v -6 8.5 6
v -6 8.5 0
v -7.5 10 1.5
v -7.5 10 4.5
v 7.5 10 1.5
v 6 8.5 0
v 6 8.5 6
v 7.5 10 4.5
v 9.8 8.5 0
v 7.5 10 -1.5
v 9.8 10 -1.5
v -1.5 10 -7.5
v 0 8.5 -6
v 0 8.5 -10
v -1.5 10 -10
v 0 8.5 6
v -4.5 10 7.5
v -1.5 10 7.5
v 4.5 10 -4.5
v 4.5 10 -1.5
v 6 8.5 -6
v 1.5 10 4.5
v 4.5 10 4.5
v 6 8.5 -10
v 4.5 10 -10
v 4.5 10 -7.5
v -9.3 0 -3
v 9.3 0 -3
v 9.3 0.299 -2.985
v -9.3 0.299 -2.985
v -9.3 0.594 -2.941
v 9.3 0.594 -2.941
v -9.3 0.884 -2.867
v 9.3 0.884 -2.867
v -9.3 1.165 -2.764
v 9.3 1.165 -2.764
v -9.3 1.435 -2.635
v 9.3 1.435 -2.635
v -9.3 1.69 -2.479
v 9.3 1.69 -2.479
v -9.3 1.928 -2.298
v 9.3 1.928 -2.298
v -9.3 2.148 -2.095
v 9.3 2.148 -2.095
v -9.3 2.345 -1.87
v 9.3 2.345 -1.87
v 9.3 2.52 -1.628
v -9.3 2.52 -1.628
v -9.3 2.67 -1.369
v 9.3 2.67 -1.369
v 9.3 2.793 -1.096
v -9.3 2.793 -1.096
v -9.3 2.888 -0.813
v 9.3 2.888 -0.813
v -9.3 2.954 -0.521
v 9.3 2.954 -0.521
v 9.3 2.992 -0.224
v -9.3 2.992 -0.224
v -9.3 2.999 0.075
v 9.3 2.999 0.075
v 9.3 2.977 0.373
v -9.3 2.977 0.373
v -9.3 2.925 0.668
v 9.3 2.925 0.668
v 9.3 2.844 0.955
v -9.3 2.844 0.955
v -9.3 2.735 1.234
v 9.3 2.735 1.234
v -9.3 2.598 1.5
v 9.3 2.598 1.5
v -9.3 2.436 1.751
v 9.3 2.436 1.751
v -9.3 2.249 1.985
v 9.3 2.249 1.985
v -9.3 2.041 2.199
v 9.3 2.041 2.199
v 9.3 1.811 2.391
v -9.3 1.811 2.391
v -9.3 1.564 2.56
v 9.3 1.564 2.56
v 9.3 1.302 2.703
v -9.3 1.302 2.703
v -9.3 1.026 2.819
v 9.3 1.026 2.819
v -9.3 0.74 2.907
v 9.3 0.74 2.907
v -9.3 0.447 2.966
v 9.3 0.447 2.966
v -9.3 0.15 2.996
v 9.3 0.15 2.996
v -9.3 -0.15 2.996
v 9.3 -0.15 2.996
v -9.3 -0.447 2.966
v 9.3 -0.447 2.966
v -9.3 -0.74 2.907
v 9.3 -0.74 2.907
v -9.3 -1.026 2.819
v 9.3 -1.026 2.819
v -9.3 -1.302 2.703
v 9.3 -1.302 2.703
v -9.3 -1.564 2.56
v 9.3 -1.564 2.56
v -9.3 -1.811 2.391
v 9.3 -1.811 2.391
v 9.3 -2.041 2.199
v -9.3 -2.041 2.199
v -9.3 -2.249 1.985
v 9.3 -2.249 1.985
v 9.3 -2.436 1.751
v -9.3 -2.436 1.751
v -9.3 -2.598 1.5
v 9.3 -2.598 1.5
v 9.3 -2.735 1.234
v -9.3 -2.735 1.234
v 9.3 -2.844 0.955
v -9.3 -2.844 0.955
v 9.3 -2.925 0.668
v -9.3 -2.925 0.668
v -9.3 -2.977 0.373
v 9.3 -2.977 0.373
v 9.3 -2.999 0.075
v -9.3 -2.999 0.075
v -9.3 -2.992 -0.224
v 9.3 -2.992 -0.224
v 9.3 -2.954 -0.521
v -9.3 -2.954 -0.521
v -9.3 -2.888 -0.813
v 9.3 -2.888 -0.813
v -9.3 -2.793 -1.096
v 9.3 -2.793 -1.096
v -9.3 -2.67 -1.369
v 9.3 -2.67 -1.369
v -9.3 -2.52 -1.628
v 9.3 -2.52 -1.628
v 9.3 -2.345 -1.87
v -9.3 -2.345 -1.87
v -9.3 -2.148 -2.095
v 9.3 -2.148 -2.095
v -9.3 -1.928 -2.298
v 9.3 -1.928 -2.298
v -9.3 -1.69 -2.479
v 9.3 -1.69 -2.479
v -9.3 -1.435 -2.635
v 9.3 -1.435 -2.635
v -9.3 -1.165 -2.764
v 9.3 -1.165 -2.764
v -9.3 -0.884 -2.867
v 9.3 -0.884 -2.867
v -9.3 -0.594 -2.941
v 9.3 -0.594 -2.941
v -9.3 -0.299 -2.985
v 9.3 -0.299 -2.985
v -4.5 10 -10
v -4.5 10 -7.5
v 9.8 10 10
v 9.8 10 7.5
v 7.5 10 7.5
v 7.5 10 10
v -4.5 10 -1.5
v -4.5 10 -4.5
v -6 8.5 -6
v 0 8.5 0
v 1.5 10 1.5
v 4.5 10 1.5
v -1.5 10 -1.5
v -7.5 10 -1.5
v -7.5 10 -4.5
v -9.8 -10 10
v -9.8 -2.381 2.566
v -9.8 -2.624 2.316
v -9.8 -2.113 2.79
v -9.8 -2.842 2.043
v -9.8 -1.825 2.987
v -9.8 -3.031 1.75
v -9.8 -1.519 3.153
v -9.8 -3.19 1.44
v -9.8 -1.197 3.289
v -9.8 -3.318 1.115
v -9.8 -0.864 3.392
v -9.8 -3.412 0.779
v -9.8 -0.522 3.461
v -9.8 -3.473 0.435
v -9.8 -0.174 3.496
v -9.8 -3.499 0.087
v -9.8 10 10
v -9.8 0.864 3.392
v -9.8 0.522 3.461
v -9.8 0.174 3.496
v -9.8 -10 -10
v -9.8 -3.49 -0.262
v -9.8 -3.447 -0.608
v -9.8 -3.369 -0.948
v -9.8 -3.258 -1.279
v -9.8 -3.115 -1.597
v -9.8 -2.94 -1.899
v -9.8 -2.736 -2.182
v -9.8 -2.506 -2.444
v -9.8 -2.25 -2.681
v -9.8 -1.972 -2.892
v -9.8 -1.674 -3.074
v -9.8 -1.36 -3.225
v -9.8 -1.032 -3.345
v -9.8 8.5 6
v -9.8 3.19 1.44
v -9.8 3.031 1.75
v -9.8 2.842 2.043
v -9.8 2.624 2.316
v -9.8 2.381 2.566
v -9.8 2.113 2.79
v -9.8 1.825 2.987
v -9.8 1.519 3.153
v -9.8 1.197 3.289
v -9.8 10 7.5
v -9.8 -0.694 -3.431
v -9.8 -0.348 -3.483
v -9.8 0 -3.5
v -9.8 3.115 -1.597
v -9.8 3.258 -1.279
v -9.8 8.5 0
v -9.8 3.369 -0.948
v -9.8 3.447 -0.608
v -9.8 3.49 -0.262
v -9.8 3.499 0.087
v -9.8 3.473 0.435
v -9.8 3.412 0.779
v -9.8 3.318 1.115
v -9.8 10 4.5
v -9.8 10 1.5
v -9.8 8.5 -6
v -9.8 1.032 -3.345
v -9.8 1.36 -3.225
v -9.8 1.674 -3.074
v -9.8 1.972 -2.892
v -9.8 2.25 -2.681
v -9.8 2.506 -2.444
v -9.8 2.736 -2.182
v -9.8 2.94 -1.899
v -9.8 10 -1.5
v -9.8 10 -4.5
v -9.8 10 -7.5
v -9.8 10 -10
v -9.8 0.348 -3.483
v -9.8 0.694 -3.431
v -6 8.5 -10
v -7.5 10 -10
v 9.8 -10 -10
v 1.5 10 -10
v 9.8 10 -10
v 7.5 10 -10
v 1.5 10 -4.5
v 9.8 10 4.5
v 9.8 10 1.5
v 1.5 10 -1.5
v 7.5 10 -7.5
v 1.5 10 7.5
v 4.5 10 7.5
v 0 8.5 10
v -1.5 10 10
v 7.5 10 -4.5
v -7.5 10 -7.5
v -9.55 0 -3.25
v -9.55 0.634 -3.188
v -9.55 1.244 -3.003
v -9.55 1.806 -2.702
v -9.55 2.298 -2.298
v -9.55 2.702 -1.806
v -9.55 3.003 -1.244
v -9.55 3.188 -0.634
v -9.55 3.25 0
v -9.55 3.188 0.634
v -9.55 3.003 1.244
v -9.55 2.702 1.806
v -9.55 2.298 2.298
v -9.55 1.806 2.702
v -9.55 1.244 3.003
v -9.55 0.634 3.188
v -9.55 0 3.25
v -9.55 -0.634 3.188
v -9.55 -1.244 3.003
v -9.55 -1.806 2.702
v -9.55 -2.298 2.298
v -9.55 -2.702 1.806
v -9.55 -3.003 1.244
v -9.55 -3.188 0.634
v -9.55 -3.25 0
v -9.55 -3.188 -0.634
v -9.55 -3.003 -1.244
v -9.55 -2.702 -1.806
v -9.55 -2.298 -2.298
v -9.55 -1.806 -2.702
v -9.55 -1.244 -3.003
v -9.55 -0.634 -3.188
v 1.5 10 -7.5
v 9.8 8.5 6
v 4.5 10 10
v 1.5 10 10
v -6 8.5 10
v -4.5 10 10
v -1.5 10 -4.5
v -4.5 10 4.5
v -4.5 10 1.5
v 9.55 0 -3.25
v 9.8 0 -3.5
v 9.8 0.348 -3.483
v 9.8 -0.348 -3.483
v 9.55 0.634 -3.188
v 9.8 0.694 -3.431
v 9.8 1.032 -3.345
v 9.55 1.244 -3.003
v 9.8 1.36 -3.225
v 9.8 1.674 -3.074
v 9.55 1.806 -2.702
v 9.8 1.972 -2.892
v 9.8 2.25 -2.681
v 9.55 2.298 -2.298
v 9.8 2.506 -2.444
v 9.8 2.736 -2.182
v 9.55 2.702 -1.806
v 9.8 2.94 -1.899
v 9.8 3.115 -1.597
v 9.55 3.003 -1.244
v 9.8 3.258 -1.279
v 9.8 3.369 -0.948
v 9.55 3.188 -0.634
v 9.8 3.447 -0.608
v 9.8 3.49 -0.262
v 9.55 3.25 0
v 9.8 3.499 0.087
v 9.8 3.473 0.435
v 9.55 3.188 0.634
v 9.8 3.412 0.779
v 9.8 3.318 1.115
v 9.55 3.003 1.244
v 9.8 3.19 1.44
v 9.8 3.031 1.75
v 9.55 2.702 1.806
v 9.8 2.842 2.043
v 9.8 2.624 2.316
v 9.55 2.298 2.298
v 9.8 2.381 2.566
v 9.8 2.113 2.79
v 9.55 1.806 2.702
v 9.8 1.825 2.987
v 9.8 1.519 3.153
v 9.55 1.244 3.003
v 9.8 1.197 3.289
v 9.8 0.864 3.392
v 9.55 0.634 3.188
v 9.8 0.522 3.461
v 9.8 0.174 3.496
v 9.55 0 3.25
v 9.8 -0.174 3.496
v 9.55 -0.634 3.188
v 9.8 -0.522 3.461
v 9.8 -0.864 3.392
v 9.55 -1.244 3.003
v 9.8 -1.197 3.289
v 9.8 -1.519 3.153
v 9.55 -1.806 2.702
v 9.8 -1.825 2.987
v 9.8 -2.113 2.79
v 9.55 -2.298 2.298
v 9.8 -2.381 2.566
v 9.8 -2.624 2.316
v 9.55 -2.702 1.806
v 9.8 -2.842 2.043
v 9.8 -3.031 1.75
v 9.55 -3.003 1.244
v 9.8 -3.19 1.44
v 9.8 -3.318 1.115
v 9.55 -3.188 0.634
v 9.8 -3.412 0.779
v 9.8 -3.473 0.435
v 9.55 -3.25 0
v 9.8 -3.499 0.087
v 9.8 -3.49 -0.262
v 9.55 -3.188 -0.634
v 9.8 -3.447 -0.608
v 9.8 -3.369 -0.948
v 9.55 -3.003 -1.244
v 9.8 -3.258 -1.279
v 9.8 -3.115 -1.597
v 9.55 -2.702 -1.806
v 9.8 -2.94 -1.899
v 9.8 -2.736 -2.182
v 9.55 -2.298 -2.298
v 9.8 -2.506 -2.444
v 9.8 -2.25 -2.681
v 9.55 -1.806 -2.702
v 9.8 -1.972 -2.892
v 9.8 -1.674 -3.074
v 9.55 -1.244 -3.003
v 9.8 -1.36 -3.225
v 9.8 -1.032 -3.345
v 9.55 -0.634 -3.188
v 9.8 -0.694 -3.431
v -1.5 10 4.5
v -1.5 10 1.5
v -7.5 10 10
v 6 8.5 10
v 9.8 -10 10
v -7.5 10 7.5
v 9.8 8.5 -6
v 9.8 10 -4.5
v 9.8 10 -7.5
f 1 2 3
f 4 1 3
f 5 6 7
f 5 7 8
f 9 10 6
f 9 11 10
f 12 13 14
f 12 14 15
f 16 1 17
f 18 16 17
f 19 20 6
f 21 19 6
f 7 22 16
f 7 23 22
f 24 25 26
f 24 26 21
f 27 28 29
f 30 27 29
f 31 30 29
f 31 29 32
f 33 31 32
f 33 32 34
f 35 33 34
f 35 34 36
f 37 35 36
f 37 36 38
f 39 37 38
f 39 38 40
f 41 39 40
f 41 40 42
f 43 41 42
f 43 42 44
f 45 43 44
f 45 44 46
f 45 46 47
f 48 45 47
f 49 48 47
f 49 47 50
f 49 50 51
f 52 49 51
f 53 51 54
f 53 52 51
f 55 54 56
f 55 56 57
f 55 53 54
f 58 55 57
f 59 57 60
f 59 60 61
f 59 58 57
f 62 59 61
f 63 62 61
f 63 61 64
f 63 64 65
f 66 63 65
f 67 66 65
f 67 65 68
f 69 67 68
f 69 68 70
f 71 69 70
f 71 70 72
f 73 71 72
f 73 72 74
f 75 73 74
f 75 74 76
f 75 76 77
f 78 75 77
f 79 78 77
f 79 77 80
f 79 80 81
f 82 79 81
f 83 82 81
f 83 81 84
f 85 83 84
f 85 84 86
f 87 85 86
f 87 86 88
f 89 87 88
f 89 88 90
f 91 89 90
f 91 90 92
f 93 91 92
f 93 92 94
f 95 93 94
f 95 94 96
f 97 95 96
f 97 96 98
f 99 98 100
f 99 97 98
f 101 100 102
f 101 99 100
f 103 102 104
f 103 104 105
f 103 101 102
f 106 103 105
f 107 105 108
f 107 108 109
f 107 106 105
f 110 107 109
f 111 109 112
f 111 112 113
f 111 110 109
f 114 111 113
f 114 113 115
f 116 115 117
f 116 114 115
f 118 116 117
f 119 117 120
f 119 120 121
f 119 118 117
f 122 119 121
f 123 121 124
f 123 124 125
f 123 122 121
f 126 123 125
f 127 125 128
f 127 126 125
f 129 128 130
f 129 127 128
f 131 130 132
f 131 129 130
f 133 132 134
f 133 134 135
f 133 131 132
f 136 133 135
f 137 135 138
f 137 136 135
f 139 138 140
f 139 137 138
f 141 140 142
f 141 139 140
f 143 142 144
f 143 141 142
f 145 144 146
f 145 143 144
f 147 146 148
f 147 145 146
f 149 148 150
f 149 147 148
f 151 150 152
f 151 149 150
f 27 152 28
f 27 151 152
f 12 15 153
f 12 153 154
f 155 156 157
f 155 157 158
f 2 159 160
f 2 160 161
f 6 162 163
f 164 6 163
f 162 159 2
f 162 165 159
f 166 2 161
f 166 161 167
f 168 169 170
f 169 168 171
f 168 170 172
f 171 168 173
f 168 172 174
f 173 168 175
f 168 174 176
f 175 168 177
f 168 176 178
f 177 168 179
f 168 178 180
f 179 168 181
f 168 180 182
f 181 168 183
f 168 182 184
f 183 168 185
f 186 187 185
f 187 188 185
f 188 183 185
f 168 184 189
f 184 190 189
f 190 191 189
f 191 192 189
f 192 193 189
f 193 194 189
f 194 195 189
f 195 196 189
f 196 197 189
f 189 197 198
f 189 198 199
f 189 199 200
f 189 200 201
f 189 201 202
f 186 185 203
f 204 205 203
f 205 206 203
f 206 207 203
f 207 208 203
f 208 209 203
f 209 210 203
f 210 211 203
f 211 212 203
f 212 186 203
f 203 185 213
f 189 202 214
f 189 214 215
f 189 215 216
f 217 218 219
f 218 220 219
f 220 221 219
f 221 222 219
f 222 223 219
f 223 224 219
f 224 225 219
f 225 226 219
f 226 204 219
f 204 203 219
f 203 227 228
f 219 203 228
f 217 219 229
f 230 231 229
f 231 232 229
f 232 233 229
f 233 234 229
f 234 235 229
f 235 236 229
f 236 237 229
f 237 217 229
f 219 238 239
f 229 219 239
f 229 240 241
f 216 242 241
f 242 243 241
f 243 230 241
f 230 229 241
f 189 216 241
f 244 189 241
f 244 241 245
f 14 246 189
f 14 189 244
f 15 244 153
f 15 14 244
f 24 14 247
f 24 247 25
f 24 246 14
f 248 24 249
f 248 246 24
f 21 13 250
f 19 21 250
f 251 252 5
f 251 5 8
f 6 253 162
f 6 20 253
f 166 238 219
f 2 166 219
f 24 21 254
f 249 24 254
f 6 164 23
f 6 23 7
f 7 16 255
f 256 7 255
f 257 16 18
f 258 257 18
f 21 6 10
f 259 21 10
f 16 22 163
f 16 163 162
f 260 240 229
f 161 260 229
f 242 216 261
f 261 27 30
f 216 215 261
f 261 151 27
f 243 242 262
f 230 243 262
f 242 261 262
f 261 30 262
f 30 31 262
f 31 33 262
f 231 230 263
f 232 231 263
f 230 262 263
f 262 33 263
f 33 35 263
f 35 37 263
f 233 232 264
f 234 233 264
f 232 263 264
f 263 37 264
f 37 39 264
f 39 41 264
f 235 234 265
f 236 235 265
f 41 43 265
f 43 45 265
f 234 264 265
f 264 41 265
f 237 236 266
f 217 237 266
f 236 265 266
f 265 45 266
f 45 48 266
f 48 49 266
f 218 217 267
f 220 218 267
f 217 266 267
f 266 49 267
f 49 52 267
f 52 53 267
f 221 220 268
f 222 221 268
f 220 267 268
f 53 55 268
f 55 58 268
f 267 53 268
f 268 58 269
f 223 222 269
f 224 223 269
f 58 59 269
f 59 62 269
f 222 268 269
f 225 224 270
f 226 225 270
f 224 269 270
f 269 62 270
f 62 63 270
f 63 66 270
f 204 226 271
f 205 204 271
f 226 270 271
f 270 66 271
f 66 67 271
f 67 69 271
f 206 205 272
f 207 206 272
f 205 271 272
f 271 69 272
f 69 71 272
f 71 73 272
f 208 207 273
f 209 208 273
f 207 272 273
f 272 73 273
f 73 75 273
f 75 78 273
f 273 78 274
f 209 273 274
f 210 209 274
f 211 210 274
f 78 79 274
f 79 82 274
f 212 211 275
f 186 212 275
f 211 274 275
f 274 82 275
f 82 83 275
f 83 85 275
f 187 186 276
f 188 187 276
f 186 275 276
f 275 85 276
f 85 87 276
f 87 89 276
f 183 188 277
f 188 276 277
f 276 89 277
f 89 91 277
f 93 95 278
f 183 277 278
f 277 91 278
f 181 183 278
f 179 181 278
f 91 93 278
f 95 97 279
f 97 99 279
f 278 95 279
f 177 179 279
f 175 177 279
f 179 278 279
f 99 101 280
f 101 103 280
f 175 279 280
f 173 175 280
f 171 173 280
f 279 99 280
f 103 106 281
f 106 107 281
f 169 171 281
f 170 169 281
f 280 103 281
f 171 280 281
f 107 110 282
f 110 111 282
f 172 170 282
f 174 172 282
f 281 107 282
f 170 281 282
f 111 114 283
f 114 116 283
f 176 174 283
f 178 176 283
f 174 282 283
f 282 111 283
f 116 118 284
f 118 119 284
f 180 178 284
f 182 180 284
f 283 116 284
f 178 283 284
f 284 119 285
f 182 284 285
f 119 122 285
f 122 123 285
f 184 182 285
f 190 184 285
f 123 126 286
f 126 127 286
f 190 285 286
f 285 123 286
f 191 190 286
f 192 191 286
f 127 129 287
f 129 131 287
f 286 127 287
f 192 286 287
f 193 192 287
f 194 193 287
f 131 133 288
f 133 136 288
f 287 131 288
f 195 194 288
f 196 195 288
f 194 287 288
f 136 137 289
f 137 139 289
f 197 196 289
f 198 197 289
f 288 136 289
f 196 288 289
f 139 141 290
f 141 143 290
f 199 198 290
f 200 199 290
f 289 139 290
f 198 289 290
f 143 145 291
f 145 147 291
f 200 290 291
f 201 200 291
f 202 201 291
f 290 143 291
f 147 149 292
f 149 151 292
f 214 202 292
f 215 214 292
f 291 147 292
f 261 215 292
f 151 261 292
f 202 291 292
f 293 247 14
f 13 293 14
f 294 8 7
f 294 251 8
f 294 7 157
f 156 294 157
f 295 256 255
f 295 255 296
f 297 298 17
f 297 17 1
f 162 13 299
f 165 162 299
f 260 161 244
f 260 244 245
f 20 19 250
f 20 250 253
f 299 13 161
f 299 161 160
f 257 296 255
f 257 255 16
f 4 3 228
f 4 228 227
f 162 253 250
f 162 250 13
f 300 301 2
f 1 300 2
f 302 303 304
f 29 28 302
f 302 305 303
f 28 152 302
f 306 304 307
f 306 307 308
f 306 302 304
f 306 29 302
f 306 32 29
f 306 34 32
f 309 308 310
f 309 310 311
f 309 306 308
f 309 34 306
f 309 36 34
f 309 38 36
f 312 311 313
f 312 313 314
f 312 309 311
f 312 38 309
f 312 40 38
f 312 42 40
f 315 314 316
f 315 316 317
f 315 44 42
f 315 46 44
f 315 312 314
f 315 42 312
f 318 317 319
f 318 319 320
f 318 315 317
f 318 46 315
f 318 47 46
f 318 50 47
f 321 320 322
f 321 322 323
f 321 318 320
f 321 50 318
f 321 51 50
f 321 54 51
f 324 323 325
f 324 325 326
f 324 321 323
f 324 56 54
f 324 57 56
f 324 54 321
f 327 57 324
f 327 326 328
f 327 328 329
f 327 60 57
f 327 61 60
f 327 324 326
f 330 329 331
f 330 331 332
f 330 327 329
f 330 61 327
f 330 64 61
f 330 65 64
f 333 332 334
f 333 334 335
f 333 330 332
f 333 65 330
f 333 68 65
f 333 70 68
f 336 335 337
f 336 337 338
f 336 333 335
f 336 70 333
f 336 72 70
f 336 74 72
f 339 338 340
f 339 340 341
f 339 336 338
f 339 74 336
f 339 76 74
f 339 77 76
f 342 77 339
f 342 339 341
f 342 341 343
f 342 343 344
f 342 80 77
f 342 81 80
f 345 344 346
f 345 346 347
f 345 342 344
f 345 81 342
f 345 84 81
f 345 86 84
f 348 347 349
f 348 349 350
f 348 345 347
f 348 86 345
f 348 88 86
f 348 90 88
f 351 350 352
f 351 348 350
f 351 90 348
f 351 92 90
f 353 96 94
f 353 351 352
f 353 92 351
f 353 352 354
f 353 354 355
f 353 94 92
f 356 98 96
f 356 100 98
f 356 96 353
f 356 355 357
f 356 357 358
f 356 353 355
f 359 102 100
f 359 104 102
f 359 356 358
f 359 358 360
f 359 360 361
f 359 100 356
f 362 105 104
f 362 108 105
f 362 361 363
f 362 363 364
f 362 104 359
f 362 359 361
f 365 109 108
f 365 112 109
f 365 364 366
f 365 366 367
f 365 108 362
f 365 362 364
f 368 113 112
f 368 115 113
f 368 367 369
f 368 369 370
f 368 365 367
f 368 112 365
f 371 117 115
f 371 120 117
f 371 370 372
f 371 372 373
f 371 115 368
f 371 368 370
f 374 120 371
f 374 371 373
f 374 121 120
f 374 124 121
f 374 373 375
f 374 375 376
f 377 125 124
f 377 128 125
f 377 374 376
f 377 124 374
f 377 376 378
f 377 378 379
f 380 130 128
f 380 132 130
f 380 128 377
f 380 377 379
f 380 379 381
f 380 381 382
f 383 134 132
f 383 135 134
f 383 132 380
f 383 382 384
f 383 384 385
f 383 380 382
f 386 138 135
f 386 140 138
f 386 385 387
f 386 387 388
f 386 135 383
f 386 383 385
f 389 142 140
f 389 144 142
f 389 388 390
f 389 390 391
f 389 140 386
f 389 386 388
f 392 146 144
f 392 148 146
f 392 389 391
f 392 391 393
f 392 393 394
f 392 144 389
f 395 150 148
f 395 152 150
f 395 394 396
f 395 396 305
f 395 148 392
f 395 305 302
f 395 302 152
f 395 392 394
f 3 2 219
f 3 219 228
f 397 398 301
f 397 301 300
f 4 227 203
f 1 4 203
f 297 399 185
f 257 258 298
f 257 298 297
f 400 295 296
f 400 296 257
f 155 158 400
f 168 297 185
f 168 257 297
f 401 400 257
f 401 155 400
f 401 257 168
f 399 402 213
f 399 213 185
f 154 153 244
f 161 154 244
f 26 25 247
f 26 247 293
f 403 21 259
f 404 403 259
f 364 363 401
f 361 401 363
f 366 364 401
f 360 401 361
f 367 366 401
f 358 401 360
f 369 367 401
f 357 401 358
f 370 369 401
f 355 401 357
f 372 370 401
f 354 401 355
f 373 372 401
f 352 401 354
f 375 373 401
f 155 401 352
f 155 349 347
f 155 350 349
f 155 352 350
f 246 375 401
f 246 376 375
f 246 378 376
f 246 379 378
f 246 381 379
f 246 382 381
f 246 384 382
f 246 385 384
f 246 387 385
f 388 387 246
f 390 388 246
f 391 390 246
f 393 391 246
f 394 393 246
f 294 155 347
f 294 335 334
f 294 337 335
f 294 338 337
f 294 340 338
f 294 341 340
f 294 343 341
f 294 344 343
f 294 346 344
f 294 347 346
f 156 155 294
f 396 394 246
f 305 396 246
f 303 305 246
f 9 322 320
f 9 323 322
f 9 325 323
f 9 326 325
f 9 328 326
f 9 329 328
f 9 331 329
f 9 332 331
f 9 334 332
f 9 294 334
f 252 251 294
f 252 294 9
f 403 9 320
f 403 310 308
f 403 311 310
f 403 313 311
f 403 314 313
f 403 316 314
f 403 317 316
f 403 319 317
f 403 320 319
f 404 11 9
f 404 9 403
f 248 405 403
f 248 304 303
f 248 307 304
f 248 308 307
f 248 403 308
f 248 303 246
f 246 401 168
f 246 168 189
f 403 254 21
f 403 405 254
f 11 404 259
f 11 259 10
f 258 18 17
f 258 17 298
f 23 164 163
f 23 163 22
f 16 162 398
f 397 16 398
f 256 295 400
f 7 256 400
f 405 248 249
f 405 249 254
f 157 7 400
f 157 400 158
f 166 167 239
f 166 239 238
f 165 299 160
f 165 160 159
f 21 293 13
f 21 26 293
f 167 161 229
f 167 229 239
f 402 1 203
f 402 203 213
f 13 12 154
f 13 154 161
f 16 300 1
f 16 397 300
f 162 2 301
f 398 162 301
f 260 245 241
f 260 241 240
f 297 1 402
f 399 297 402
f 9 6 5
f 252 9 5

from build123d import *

# Parameters (mm, degrees)
SKETCH1_R               = 3
BOSS_EXTRUDE1_DEPTH     = 9.8
CUT_EXTRUDE1_DEPTH      = 18.205812971
CUT_EXTRUDE1_DEPTH_BACK = 18.205812971
CHAMFER1_SIZE           = 0.5


with BuildPart() as part:
    # Sketch1 → Boss-Extrude1 (new, symmetric)
    with BuildSketch(Plane(origin=(0, 0, 0), x_dir=(0, 0, -1), z_dir=(1, 0, 0))):
        Polygon((-10, 10), (-10, -10), (10, -10), (10, 10), (7.5, 10), (6, 8.5), (4.5, 10), (1.5, 10), (0, 8.5), (-1.5, 10), (-4.5, 10), (-6, 8.5), (-7.5, 10), align=None)
        Circle(SKETCH1_R, mode=Mode.SUBTRACT)
    extrude(amount=BOSS_EXTRUDE1_DEPTH, both=True)

    # Sketch2 → Cut-Extrude1 (cut, two sides: drawn at the far end of the back side and taken through both)
    with BuildSketch(Plane.XY.offset(-CUT_EXTRUDE1_DEPTH_BACK)):
        Polygon((-7.5, 10), (-4.5, 10), (-6, 8.5), align=None)
        Polygon((0, 8.5), (-1.5, 10), (1.5, 10), align=None)
        Polygon((4.5, 10), (6, 8.5), (7.5, 10), align=None)
    extrude(amount=CUT_EXTRUDE1_DEPTH + CUT_EXTRUDE1_DEPTH_BACK, mode=Mode.SUBTRACT)

    # Chamfer1
    chamfer1_edges = [part.edges().sort_by_distance(p)[0] for p in [
        (-9.8, 0, 3),
        (9.8, 0, 3),
    ]]
    chamfer(chamfer1_edges, length=CHAMFER1_SIZE)


solid = part.part
